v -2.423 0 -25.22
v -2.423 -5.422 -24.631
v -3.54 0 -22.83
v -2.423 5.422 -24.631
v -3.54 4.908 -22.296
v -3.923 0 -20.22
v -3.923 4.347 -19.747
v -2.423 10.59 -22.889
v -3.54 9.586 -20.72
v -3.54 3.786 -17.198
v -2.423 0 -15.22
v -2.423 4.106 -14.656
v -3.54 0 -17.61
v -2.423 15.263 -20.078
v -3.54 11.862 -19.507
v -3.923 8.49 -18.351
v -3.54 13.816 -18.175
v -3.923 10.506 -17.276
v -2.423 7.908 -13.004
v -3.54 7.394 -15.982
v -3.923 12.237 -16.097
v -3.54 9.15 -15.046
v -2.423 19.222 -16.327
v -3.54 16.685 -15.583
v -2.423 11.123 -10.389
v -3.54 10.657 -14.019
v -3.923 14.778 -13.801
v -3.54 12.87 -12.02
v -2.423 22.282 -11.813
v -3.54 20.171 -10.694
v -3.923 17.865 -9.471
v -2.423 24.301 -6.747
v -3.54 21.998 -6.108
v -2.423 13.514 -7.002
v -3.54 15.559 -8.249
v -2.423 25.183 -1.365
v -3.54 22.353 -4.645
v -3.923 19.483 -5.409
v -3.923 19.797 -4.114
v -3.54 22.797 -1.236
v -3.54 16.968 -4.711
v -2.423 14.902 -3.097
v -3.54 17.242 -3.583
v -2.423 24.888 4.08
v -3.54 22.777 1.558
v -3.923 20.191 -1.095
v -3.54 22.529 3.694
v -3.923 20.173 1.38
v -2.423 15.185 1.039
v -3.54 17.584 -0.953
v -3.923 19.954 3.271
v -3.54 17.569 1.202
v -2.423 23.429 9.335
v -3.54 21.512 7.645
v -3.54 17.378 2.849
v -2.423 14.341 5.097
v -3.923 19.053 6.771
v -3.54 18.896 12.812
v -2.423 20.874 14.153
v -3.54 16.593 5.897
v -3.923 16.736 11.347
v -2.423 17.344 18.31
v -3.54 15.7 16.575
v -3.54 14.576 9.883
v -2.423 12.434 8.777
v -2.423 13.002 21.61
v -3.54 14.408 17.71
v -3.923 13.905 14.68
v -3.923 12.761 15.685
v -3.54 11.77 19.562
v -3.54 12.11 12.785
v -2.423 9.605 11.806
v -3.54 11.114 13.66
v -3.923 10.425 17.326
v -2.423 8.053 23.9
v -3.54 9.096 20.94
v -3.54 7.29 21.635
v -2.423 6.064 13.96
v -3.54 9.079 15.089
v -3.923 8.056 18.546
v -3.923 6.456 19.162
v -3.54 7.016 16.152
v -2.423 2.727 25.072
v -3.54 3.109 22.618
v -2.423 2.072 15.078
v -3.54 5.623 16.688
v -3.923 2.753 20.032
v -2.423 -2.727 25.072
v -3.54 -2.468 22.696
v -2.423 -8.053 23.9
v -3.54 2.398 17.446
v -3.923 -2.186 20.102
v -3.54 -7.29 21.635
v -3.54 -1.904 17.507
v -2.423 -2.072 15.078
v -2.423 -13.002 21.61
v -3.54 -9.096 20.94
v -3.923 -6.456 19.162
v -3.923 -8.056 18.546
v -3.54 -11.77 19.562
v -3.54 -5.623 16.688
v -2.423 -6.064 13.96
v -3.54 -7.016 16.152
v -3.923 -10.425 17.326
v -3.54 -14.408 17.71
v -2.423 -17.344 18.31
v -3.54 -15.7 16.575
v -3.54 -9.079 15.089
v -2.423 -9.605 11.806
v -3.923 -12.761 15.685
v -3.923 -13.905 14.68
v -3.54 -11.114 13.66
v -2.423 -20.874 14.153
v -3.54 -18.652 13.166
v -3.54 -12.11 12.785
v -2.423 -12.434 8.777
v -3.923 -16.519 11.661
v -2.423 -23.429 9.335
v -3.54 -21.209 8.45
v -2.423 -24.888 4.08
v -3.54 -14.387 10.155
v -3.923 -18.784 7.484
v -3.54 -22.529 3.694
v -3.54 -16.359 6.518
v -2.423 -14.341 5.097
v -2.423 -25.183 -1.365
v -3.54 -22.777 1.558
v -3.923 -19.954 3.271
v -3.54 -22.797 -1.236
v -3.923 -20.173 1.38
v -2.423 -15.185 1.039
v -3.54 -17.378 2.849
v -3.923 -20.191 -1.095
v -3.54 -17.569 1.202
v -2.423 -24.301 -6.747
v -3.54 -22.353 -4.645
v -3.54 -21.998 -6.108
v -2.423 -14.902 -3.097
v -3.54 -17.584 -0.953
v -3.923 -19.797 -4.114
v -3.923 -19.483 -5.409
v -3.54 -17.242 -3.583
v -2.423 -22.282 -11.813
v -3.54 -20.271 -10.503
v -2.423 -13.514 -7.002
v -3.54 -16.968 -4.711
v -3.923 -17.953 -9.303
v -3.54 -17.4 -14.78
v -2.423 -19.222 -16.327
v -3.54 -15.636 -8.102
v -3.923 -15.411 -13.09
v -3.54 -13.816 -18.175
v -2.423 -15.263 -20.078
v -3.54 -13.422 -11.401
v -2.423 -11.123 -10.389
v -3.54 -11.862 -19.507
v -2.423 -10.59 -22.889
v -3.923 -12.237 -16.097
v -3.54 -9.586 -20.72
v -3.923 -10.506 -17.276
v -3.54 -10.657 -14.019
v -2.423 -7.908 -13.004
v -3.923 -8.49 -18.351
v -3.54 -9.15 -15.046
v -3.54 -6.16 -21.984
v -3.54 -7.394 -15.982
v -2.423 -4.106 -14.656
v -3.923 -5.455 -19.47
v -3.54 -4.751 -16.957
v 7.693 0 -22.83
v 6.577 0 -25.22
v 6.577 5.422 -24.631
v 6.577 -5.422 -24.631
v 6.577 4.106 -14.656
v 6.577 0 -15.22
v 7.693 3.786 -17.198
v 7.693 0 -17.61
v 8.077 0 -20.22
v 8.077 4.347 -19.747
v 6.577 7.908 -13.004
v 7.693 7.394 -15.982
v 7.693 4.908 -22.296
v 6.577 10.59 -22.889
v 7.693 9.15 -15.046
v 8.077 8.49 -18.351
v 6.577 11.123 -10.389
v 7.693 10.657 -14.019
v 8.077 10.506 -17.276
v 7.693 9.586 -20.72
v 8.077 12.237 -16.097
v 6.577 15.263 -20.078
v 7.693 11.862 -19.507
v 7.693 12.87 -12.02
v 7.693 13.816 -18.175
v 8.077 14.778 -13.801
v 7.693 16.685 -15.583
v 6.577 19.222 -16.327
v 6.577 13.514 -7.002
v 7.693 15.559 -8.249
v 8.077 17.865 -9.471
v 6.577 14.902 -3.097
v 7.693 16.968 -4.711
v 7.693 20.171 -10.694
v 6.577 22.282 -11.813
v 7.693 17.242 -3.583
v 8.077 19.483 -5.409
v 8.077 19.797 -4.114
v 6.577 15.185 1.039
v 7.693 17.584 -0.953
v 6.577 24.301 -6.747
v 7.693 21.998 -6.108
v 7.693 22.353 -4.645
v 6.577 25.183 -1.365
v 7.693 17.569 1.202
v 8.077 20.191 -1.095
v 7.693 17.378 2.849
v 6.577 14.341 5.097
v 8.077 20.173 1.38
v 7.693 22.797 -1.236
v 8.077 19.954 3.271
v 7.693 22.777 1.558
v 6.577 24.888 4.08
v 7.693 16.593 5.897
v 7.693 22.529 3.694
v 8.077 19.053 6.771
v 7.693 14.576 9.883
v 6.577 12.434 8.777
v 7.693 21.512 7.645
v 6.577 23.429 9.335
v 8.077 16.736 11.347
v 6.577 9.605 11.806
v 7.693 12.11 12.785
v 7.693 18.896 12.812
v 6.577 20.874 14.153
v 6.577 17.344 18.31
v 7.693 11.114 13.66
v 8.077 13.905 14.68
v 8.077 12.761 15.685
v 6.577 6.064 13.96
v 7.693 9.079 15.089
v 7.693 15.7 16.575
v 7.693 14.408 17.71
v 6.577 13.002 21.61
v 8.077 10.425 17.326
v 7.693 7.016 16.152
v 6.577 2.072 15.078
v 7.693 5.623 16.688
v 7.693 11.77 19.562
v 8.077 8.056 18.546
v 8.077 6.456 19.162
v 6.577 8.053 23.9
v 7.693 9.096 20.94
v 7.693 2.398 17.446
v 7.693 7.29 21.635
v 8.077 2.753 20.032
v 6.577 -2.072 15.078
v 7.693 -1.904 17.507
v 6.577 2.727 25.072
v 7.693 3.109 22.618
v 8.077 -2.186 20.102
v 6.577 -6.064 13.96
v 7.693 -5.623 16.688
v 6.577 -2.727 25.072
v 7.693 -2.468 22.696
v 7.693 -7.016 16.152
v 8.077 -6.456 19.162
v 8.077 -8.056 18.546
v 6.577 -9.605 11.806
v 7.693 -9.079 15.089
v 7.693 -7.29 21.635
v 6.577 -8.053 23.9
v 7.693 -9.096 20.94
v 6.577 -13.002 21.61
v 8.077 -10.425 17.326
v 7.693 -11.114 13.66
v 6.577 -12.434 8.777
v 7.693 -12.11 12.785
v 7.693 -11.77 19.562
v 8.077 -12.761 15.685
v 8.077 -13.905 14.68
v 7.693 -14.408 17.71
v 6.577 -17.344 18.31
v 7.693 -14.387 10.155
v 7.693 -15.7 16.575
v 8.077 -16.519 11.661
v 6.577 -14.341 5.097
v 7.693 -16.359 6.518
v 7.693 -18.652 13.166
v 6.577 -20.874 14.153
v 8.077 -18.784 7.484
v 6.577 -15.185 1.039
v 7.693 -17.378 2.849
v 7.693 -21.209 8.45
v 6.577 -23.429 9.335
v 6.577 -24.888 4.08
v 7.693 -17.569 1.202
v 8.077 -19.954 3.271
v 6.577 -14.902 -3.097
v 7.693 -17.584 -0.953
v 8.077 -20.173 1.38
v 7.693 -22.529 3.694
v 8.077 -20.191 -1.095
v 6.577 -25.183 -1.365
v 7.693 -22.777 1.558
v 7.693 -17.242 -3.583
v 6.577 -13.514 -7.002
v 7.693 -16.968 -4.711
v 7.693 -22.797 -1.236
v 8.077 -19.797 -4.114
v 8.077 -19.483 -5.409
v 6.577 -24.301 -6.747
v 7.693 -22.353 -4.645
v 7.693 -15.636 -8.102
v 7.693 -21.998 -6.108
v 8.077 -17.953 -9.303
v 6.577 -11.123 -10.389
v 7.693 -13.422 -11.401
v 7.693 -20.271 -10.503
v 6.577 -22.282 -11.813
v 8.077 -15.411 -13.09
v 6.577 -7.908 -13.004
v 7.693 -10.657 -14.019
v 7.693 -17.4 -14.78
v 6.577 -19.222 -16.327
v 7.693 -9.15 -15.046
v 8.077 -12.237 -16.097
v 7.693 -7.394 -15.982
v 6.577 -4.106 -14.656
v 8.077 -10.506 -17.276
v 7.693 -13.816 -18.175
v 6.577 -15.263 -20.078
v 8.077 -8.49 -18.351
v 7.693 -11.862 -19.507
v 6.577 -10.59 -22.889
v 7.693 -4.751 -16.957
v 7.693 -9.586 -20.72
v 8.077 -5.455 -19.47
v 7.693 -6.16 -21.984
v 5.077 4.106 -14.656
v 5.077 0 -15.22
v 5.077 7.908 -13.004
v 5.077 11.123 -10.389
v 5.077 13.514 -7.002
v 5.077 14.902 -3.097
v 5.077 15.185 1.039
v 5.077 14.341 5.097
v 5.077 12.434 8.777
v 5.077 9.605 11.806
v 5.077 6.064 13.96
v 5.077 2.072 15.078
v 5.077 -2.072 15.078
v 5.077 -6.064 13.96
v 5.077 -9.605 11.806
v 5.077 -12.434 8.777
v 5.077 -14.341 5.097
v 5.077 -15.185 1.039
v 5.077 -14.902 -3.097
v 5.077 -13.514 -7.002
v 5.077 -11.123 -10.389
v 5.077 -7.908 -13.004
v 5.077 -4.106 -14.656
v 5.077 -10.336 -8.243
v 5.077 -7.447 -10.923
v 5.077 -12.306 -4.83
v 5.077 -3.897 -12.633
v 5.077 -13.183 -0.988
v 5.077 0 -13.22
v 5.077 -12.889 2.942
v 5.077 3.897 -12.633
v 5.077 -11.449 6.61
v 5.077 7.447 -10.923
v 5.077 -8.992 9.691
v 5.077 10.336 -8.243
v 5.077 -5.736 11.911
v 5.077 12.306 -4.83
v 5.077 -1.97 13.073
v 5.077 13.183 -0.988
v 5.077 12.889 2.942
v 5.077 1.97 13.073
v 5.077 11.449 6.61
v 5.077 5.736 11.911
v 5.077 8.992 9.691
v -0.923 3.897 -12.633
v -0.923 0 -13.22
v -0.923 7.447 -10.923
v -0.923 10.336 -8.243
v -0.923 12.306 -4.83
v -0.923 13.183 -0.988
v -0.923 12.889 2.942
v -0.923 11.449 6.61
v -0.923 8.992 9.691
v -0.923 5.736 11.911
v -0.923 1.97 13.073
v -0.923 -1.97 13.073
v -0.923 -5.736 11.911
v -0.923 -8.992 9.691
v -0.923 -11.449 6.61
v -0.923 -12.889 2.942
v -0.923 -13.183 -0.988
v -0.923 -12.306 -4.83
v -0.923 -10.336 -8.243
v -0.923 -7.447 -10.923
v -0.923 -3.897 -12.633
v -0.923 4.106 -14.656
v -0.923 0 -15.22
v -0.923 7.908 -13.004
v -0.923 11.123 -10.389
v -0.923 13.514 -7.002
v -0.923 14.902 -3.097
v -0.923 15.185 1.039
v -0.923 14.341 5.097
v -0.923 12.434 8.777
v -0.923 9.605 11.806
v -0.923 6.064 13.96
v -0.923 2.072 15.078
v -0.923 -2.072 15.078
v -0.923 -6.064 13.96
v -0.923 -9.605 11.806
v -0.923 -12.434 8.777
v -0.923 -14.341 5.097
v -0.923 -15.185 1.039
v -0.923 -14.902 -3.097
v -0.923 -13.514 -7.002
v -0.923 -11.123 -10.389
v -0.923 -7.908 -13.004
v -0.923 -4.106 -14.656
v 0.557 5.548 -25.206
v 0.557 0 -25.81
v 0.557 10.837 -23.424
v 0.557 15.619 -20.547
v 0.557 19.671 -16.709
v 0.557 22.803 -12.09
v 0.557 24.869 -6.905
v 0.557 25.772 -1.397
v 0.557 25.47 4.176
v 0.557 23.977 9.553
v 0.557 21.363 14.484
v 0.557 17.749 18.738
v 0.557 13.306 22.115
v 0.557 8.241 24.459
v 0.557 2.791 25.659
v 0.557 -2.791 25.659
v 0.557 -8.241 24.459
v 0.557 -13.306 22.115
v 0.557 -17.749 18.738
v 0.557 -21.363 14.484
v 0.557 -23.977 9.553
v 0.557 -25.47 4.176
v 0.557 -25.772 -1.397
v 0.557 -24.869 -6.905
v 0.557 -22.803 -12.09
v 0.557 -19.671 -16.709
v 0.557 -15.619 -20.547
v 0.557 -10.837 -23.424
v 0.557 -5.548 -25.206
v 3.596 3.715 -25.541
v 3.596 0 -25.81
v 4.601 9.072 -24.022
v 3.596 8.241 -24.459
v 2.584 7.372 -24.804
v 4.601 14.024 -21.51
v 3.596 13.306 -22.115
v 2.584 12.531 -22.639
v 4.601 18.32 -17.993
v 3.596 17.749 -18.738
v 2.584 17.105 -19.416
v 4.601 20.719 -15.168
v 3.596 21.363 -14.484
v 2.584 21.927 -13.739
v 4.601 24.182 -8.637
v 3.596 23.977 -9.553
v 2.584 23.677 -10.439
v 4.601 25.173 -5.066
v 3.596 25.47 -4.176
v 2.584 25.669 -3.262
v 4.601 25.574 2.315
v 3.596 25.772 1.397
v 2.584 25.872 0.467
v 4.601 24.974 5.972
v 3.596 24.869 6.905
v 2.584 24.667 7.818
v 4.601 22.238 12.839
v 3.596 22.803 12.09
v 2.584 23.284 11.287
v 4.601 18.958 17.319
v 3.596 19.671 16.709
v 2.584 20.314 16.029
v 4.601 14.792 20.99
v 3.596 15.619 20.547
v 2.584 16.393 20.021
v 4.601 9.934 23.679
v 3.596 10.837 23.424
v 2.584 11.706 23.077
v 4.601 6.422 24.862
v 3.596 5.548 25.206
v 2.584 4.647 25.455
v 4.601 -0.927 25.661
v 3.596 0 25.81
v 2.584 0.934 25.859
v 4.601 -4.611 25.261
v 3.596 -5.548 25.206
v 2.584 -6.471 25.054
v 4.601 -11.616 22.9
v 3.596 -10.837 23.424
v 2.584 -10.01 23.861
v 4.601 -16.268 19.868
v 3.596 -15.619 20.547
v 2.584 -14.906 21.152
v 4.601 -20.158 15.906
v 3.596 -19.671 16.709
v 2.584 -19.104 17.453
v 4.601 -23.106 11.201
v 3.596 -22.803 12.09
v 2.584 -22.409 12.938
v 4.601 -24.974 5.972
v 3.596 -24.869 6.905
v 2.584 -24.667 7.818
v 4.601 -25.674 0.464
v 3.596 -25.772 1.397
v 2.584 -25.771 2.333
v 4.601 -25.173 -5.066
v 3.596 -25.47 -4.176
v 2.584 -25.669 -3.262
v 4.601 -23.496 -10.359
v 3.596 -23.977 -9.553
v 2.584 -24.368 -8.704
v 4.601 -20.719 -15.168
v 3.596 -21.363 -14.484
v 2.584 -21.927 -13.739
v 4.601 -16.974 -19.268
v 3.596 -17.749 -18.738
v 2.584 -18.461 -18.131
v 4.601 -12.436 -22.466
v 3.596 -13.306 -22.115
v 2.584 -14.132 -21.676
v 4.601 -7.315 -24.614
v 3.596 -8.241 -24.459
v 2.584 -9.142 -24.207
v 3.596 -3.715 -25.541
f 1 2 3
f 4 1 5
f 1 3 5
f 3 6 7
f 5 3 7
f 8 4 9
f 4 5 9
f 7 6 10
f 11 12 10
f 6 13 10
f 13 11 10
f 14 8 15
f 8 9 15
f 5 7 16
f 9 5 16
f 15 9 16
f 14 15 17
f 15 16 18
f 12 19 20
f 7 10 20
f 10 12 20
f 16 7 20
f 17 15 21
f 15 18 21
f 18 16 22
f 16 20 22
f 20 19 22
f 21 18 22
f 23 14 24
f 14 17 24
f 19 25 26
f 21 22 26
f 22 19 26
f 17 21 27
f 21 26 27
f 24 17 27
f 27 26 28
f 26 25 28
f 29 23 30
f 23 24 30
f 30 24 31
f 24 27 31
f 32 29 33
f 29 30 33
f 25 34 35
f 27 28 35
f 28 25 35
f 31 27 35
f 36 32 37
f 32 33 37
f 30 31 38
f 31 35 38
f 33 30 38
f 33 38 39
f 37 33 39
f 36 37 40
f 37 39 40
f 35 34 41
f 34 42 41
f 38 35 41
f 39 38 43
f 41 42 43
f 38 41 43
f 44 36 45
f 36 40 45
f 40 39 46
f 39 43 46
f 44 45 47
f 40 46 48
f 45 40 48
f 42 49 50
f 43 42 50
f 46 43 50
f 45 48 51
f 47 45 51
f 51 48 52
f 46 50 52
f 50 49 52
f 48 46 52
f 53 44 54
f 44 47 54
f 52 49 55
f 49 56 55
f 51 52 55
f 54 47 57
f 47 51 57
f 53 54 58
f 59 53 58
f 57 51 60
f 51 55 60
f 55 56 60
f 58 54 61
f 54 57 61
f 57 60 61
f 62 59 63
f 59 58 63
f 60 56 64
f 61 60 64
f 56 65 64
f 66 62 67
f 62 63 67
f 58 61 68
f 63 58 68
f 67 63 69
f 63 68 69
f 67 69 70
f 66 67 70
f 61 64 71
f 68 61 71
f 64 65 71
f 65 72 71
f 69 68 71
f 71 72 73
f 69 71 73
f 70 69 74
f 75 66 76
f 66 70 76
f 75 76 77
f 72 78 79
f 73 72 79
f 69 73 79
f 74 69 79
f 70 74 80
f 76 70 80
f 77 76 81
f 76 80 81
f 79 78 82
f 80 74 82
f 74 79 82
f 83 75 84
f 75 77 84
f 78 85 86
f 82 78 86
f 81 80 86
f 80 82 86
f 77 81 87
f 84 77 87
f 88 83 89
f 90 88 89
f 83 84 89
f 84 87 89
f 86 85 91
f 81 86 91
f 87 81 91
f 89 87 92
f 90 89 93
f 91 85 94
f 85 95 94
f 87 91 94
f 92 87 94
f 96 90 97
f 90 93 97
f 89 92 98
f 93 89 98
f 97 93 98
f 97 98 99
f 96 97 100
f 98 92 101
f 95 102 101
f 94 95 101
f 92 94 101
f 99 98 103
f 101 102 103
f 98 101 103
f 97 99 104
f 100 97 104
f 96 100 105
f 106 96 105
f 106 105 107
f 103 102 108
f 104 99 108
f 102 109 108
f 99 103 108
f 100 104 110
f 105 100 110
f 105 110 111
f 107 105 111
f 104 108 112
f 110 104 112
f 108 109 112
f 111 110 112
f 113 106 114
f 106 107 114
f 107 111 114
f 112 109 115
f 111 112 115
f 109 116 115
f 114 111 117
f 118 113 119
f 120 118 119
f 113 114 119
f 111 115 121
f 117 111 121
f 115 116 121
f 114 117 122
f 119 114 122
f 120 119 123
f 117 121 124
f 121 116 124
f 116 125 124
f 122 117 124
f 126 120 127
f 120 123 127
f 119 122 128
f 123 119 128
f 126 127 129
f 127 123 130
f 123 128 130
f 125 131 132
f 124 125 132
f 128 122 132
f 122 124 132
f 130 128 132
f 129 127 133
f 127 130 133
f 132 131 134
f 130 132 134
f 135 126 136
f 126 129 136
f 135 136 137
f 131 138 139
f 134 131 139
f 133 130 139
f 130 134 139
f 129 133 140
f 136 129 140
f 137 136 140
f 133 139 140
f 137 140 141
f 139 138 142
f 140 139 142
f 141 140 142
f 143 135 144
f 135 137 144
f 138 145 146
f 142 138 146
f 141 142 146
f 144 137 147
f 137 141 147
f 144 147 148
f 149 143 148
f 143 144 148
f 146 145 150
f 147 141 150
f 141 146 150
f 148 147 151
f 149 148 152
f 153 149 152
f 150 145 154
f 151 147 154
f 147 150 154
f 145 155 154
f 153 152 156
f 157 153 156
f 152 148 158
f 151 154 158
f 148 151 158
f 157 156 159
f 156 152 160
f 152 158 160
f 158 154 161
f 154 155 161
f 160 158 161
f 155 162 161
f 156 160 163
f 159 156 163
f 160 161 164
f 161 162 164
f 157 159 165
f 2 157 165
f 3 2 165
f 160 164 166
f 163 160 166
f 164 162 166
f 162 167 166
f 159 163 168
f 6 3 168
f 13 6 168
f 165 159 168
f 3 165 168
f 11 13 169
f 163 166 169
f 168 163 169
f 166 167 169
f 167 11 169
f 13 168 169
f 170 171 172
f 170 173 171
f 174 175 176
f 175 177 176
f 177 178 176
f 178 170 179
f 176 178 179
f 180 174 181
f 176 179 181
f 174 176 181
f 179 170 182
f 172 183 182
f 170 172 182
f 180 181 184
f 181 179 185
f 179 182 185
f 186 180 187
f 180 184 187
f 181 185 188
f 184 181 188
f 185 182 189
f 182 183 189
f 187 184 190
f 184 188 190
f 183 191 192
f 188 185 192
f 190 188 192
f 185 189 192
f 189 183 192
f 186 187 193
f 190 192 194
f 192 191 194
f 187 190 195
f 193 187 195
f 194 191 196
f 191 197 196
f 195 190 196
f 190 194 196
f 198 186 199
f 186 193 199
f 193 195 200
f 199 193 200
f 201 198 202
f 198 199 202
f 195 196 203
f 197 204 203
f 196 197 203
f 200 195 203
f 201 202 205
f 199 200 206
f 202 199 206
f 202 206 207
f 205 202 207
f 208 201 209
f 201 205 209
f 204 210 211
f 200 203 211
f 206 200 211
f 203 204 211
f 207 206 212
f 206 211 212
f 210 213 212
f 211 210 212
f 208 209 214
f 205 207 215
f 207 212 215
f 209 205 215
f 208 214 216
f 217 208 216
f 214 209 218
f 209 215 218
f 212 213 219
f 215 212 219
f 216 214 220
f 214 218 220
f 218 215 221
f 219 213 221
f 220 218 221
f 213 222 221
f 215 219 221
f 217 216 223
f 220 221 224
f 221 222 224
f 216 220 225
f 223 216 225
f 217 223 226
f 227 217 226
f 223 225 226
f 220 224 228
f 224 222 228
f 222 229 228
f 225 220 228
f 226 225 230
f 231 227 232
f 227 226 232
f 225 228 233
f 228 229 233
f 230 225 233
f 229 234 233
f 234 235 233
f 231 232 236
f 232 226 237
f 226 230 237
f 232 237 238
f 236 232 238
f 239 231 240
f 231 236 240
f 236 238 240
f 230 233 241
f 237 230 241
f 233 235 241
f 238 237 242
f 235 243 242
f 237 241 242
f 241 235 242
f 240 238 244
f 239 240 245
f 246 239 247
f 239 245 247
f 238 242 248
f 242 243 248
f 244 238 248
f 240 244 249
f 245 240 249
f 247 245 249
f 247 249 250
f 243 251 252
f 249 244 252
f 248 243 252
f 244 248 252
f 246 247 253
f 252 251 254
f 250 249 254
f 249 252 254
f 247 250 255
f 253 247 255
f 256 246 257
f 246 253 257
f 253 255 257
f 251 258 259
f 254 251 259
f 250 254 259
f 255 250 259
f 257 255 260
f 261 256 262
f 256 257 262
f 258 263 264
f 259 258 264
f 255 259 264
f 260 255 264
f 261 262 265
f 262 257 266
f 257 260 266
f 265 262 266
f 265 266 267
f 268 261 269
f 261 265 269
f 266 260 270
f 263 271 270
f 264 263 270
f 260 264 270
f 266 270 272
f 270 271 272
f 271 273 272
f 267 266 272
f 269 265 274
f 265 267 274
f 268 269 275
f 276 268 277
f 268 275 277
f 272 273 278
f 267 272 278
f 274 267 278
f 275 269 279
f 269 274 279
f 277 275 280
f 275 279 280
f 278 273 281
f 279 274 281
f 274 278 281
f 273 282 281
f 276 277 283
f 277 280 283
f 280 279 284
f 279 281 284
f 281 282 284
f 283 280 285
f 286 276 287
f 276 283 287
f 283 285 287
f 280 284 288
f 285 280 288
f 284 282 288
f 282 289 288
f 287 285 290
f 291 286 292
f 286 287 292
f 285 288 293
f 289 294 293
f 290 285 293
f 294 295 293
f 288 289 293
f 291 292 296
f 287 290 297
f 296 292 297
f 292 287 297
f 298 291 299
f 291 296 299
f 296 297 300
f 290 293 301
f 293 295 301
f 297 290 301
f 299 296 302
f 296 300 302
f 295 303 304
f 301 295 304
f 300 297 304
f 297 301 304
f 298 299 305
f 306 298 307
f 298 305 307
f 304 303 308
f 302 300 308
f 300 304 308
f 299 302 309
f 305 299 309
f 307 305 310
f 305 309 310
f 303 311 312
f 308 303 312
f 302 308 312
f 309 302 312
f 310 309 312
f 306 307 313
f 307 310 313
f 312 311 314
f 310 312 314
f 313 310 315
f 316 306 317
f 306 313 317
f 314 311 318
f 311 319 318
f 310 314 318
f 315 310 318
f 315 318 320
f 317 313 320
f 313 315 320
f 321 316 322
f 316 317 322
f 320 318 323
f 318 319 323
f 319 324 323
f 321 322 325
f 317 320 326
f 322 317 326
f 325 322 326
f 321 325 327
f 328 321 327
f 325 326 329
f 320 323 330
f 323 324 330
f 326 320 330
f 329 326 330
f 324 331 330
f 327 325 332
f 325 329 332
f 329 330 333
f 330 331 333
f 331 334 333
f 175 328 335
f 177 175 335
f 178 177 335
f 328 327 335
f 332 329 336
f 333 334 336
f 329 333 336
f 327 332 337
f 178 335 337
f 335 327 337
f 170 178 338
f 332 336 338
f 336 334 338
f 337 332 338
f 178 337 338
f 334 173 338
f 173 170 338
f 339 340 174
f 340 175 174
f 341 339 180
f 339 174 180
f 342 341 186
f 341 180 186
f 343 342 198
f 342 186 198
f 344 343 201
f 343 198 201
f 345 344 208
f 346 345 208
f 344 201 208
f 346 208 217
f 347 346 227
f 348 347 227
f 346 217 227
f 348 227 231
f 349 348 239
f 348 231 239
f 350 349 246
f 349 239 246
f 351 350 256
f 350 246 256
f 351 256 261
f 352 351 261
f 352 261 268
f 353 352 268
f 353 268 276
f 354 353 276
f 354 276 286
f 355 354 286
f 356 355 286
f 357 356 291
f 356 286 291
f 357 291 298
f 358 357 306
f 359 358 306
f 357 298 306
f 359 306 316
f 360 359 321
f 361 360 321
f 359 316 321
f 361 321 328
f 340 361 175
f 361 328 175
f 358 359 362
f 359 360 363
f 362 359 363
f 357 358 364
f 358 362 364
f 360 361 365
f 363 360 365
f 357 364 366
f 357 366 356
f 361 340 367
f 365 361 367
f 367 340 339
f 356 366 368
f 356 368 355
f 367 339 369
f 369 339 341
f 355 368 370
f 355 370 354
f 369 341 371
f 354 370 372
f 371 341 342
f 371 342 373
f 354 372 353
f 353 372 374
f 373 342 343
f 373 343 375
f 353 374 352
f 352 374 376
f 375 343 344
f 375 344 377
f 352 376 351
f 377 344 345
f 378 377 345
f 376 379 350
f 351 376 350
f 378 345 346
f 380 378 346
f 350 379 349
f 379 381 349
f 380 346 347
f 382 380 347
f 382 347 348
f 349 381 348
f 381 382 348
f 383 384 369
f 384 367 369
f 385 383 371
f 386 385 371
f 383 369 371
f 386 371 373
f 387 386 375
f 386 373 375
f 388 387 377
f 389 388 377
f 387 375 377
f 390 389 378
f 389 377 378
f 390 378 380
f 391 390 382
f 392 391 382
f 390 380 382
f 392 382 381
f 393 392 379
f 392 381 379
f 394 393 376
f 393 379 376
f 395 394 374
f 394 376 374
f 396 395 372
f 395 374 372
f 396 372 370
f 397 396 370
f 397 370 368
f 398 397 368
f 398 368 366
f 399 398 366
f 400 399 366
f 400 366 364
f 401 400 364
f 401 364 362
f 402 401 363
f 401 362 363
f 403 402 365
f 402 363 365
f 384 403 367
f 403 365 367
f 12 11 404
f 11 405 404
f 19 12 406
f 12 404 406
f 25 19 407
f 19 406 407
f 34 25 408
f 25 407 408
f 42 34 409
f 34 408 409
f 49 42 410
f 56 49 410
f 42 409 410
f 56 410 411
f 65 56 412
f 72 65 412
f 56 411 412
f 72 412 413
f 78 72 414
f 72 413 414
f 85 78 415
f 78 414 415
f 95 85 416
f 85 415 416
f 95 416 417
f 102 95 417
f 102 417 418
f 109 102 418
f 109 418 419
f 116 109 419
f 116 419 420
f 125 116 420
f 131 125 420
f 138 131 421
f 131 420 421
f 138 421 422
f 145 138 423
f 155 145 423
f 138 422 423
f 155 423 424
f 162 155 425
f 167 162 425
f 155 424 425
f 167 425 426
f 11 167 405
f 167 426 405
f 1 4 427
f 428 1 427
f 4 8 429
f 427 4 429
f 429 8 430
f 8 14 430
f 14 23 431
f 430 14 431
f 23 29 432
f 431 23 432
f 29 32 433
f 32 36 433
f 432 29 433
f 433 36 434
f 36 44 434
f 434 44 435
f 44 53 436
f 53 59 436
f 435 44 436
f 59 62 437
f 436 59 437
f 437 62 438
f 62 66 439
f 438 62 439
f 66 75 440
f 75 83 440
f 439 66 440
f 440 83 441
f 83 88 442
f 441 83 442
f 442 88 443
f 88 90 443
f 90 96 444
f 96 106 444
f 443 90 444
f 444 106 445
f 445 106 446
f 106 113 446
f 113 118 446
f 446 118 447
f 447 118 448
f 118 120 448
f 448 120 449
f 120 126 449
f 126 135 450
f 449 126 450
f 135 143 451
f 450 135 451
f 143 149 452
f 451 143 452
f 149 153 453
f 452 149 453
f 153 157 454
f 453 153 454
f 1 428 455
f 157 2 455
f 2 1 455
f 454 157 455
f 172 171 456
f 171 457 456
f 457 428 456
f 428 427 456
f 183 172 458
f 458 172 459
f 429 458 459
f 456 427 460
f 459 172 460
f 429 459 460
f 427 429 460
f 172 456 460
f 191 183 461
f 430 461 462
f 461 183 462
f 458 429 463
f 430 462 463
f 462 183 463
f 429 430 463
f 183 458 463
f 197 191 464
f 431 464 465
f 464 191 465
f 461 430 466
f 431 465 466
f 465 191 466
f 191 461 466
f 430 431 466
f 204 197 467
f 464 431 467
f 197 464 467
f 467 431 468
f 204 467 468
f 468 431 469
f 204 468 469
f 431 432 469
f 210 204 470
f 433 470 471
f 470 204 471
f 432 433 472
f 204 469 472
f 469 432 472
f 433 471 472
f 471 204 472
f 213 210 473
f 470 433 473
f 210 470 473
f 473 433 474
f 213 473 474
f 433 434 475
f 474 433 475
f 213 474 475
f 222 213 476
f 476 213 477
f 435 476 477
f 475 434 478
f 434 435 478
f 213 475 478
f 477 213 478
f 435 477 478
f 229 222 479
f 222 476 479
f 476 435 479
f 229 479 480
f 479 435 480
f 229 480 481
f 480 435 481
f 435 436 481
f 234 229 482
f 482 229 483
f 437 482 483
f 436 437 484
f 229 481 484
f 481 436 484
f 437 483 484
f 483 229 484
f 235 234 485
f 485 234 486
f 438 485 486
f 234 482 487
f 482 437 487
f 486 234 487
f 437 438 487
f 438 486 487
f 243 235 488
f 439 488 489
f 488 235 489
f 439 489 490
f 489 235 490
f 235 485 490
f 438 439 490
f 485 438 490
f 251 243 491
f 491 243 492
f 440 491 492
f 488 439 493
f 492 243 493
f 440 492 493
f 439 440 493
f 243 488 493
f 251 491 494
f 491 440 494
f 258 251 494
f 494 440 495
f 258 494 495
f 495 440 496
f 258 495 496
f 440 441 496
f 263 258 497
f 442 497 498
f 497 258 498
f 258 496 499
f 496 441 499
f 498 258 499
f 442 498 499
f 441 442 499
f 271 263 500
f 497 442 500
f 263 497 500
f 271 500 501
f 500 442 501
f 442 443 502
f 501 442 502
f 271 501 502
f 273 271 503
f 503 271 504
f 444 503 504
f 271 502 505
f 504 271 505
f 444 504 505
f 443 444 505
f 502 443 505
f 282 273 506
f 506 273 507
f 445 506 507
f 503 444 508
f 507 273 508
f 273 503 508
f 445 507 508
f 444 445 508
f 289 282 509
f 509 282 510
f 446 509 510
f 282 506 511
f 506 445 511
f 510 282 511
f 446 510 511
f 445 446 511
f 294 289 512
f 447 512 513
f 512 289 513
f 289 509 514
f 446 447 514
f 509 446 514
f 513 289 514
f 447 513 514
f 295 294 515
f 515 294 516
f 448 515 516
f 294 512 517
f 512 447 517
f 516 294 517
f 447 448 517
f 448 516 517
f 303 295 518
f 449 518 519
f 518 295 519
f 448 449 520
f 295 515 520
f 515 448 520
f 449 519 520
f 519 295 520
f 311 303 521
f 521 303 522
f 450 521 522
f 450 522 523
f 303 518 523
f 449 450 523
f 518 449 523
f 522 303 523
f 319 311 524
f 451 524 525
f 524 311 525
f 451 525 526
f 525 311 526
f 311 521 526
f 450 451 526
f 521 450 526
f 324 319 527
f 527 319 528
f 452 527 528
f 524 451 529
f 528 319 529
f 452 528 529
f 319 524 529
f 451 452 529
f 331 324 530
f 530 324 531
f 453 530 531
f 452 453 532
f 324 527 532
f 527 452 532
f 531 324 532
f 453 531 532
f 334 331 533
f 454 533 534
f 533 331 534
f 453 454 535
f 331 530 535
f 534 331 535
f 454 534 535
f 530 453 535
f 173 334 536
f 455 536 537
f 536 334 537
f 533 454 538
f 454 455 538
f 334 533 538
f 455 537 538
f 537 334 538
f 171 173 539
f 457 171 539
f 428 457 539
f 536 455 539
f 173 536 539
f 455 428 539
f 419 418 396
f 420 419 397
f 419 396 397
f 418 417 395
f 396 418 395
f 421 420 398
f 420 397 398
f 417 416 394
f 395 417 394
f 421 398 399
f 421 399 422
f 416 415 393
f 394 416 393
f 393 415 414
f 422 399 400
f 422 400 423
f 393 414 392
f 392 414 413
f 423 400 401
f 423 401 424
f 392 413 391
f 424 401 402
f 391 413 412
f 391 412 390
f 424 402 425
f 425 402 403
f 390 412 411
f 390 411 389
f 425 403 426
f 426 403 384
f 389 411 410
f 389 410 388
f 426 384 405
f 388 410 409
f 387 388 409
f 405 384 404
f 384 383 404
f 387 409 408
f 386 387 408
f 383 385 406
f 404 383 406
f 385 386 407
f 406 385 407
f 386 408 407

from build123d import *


with BuildPart() as part:
    # Sketch1 → Revolve1 (revolve)
    with BuildSketch(Plane(origin=(0, 0, 0), x_dir=(1, 0, 0), z_dir=(0, 1, 0))):
        with BuildLine():
            Line((-0.923496983, 13.220158419), (5.076503017, 13.220158419))
            Line((5.076503017, 13.220158419), (5.076503017, 15.220158419))
            Line((5.076503017, 15.220158419), (6.576503017, 15.220158419))
            ThreePointArc((6.576503017, 15.220158419), (8.076503017, 20.220158419), (6.576503017, 25.220158419))
            ThreePointArc((6.576503017, 25.220158419), (2.076503017, 25.884128338), (-2.423496983, 25.220158419))
            ThreePointArc((-2.423496983, 25.220158419), (-3.923496983, 20.220158419), (-2.423496983, 15.220158419))
            Line((-2.423496983, 15.220158419), (-0.923496983, 15.220158419))
            Line((-0.923496983, 15.220158419), (-0.923496983, 13.220158419))
        make_face()
    revolve(axis=Axis((-18.907532969, 0, 0), (1, 0, 0)))


solid = part.part
